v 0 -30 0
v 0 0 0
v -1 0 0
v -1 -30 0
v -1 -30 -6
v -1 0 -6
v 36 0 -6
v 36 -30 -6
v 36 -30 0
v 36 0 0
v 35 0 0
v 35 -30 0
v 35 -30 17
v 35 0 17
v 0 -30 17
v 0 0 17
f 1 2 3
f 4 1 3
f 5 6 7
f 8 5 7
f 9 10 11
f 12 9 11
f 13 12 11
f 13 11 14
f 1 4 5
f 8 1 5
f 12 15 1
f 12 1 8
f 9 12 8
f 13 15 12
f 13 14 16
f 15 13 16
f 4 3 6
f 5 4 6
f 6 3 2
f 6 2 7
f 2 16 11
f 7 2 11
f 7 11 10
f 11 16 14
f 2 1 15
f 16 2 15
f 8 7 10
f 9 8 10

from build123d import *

# Parameters (mm, degrees)
F0_W     = 7
F0_H     = 17
F0_W_2   = 37
F0_H_2   = 2
F1_DEPTH = 30


# Not quite as in the source:
# - a feature names something its author has since deleted; it is built from what else it names


with BuildPart() as f1:
    # F0 (on Front) → F1 (new body)
    with BuildSketch(Plane.XZ):
        with Locations((31.5, 8.5)):
            Rectangle(F0_W, F0_H)
        with Locations((3.5, 8.5)):
            Rectangle(F0_W, F0_H)
        with Locations((17.5, 8.5)):
            Rectangle(F0_W, F0_H)
        with Locations((17.5, -3)):
            Rectangle(F0_W_2, F0_H_2)
        with Locations((10.5, 8.5)):
            Rectangle(F0_W, F0_H)
        Polygon((36, -4), (-1, -4), (-1, -6), (0, -6), (35, -6), (36, -6), align=None)
        Polygon((7, 0), (0, 0), (-1, 0), (-1, -2), (36, -2), (36, 0), (35, 0), (28, 0), (21, 0), (14, 0), align=None)
        with Locations((24.5, 8.5)):
            Rectangle(F0_W, F0_H)
    extrude(amount=F1_DEPTH)


solid = f1.part
